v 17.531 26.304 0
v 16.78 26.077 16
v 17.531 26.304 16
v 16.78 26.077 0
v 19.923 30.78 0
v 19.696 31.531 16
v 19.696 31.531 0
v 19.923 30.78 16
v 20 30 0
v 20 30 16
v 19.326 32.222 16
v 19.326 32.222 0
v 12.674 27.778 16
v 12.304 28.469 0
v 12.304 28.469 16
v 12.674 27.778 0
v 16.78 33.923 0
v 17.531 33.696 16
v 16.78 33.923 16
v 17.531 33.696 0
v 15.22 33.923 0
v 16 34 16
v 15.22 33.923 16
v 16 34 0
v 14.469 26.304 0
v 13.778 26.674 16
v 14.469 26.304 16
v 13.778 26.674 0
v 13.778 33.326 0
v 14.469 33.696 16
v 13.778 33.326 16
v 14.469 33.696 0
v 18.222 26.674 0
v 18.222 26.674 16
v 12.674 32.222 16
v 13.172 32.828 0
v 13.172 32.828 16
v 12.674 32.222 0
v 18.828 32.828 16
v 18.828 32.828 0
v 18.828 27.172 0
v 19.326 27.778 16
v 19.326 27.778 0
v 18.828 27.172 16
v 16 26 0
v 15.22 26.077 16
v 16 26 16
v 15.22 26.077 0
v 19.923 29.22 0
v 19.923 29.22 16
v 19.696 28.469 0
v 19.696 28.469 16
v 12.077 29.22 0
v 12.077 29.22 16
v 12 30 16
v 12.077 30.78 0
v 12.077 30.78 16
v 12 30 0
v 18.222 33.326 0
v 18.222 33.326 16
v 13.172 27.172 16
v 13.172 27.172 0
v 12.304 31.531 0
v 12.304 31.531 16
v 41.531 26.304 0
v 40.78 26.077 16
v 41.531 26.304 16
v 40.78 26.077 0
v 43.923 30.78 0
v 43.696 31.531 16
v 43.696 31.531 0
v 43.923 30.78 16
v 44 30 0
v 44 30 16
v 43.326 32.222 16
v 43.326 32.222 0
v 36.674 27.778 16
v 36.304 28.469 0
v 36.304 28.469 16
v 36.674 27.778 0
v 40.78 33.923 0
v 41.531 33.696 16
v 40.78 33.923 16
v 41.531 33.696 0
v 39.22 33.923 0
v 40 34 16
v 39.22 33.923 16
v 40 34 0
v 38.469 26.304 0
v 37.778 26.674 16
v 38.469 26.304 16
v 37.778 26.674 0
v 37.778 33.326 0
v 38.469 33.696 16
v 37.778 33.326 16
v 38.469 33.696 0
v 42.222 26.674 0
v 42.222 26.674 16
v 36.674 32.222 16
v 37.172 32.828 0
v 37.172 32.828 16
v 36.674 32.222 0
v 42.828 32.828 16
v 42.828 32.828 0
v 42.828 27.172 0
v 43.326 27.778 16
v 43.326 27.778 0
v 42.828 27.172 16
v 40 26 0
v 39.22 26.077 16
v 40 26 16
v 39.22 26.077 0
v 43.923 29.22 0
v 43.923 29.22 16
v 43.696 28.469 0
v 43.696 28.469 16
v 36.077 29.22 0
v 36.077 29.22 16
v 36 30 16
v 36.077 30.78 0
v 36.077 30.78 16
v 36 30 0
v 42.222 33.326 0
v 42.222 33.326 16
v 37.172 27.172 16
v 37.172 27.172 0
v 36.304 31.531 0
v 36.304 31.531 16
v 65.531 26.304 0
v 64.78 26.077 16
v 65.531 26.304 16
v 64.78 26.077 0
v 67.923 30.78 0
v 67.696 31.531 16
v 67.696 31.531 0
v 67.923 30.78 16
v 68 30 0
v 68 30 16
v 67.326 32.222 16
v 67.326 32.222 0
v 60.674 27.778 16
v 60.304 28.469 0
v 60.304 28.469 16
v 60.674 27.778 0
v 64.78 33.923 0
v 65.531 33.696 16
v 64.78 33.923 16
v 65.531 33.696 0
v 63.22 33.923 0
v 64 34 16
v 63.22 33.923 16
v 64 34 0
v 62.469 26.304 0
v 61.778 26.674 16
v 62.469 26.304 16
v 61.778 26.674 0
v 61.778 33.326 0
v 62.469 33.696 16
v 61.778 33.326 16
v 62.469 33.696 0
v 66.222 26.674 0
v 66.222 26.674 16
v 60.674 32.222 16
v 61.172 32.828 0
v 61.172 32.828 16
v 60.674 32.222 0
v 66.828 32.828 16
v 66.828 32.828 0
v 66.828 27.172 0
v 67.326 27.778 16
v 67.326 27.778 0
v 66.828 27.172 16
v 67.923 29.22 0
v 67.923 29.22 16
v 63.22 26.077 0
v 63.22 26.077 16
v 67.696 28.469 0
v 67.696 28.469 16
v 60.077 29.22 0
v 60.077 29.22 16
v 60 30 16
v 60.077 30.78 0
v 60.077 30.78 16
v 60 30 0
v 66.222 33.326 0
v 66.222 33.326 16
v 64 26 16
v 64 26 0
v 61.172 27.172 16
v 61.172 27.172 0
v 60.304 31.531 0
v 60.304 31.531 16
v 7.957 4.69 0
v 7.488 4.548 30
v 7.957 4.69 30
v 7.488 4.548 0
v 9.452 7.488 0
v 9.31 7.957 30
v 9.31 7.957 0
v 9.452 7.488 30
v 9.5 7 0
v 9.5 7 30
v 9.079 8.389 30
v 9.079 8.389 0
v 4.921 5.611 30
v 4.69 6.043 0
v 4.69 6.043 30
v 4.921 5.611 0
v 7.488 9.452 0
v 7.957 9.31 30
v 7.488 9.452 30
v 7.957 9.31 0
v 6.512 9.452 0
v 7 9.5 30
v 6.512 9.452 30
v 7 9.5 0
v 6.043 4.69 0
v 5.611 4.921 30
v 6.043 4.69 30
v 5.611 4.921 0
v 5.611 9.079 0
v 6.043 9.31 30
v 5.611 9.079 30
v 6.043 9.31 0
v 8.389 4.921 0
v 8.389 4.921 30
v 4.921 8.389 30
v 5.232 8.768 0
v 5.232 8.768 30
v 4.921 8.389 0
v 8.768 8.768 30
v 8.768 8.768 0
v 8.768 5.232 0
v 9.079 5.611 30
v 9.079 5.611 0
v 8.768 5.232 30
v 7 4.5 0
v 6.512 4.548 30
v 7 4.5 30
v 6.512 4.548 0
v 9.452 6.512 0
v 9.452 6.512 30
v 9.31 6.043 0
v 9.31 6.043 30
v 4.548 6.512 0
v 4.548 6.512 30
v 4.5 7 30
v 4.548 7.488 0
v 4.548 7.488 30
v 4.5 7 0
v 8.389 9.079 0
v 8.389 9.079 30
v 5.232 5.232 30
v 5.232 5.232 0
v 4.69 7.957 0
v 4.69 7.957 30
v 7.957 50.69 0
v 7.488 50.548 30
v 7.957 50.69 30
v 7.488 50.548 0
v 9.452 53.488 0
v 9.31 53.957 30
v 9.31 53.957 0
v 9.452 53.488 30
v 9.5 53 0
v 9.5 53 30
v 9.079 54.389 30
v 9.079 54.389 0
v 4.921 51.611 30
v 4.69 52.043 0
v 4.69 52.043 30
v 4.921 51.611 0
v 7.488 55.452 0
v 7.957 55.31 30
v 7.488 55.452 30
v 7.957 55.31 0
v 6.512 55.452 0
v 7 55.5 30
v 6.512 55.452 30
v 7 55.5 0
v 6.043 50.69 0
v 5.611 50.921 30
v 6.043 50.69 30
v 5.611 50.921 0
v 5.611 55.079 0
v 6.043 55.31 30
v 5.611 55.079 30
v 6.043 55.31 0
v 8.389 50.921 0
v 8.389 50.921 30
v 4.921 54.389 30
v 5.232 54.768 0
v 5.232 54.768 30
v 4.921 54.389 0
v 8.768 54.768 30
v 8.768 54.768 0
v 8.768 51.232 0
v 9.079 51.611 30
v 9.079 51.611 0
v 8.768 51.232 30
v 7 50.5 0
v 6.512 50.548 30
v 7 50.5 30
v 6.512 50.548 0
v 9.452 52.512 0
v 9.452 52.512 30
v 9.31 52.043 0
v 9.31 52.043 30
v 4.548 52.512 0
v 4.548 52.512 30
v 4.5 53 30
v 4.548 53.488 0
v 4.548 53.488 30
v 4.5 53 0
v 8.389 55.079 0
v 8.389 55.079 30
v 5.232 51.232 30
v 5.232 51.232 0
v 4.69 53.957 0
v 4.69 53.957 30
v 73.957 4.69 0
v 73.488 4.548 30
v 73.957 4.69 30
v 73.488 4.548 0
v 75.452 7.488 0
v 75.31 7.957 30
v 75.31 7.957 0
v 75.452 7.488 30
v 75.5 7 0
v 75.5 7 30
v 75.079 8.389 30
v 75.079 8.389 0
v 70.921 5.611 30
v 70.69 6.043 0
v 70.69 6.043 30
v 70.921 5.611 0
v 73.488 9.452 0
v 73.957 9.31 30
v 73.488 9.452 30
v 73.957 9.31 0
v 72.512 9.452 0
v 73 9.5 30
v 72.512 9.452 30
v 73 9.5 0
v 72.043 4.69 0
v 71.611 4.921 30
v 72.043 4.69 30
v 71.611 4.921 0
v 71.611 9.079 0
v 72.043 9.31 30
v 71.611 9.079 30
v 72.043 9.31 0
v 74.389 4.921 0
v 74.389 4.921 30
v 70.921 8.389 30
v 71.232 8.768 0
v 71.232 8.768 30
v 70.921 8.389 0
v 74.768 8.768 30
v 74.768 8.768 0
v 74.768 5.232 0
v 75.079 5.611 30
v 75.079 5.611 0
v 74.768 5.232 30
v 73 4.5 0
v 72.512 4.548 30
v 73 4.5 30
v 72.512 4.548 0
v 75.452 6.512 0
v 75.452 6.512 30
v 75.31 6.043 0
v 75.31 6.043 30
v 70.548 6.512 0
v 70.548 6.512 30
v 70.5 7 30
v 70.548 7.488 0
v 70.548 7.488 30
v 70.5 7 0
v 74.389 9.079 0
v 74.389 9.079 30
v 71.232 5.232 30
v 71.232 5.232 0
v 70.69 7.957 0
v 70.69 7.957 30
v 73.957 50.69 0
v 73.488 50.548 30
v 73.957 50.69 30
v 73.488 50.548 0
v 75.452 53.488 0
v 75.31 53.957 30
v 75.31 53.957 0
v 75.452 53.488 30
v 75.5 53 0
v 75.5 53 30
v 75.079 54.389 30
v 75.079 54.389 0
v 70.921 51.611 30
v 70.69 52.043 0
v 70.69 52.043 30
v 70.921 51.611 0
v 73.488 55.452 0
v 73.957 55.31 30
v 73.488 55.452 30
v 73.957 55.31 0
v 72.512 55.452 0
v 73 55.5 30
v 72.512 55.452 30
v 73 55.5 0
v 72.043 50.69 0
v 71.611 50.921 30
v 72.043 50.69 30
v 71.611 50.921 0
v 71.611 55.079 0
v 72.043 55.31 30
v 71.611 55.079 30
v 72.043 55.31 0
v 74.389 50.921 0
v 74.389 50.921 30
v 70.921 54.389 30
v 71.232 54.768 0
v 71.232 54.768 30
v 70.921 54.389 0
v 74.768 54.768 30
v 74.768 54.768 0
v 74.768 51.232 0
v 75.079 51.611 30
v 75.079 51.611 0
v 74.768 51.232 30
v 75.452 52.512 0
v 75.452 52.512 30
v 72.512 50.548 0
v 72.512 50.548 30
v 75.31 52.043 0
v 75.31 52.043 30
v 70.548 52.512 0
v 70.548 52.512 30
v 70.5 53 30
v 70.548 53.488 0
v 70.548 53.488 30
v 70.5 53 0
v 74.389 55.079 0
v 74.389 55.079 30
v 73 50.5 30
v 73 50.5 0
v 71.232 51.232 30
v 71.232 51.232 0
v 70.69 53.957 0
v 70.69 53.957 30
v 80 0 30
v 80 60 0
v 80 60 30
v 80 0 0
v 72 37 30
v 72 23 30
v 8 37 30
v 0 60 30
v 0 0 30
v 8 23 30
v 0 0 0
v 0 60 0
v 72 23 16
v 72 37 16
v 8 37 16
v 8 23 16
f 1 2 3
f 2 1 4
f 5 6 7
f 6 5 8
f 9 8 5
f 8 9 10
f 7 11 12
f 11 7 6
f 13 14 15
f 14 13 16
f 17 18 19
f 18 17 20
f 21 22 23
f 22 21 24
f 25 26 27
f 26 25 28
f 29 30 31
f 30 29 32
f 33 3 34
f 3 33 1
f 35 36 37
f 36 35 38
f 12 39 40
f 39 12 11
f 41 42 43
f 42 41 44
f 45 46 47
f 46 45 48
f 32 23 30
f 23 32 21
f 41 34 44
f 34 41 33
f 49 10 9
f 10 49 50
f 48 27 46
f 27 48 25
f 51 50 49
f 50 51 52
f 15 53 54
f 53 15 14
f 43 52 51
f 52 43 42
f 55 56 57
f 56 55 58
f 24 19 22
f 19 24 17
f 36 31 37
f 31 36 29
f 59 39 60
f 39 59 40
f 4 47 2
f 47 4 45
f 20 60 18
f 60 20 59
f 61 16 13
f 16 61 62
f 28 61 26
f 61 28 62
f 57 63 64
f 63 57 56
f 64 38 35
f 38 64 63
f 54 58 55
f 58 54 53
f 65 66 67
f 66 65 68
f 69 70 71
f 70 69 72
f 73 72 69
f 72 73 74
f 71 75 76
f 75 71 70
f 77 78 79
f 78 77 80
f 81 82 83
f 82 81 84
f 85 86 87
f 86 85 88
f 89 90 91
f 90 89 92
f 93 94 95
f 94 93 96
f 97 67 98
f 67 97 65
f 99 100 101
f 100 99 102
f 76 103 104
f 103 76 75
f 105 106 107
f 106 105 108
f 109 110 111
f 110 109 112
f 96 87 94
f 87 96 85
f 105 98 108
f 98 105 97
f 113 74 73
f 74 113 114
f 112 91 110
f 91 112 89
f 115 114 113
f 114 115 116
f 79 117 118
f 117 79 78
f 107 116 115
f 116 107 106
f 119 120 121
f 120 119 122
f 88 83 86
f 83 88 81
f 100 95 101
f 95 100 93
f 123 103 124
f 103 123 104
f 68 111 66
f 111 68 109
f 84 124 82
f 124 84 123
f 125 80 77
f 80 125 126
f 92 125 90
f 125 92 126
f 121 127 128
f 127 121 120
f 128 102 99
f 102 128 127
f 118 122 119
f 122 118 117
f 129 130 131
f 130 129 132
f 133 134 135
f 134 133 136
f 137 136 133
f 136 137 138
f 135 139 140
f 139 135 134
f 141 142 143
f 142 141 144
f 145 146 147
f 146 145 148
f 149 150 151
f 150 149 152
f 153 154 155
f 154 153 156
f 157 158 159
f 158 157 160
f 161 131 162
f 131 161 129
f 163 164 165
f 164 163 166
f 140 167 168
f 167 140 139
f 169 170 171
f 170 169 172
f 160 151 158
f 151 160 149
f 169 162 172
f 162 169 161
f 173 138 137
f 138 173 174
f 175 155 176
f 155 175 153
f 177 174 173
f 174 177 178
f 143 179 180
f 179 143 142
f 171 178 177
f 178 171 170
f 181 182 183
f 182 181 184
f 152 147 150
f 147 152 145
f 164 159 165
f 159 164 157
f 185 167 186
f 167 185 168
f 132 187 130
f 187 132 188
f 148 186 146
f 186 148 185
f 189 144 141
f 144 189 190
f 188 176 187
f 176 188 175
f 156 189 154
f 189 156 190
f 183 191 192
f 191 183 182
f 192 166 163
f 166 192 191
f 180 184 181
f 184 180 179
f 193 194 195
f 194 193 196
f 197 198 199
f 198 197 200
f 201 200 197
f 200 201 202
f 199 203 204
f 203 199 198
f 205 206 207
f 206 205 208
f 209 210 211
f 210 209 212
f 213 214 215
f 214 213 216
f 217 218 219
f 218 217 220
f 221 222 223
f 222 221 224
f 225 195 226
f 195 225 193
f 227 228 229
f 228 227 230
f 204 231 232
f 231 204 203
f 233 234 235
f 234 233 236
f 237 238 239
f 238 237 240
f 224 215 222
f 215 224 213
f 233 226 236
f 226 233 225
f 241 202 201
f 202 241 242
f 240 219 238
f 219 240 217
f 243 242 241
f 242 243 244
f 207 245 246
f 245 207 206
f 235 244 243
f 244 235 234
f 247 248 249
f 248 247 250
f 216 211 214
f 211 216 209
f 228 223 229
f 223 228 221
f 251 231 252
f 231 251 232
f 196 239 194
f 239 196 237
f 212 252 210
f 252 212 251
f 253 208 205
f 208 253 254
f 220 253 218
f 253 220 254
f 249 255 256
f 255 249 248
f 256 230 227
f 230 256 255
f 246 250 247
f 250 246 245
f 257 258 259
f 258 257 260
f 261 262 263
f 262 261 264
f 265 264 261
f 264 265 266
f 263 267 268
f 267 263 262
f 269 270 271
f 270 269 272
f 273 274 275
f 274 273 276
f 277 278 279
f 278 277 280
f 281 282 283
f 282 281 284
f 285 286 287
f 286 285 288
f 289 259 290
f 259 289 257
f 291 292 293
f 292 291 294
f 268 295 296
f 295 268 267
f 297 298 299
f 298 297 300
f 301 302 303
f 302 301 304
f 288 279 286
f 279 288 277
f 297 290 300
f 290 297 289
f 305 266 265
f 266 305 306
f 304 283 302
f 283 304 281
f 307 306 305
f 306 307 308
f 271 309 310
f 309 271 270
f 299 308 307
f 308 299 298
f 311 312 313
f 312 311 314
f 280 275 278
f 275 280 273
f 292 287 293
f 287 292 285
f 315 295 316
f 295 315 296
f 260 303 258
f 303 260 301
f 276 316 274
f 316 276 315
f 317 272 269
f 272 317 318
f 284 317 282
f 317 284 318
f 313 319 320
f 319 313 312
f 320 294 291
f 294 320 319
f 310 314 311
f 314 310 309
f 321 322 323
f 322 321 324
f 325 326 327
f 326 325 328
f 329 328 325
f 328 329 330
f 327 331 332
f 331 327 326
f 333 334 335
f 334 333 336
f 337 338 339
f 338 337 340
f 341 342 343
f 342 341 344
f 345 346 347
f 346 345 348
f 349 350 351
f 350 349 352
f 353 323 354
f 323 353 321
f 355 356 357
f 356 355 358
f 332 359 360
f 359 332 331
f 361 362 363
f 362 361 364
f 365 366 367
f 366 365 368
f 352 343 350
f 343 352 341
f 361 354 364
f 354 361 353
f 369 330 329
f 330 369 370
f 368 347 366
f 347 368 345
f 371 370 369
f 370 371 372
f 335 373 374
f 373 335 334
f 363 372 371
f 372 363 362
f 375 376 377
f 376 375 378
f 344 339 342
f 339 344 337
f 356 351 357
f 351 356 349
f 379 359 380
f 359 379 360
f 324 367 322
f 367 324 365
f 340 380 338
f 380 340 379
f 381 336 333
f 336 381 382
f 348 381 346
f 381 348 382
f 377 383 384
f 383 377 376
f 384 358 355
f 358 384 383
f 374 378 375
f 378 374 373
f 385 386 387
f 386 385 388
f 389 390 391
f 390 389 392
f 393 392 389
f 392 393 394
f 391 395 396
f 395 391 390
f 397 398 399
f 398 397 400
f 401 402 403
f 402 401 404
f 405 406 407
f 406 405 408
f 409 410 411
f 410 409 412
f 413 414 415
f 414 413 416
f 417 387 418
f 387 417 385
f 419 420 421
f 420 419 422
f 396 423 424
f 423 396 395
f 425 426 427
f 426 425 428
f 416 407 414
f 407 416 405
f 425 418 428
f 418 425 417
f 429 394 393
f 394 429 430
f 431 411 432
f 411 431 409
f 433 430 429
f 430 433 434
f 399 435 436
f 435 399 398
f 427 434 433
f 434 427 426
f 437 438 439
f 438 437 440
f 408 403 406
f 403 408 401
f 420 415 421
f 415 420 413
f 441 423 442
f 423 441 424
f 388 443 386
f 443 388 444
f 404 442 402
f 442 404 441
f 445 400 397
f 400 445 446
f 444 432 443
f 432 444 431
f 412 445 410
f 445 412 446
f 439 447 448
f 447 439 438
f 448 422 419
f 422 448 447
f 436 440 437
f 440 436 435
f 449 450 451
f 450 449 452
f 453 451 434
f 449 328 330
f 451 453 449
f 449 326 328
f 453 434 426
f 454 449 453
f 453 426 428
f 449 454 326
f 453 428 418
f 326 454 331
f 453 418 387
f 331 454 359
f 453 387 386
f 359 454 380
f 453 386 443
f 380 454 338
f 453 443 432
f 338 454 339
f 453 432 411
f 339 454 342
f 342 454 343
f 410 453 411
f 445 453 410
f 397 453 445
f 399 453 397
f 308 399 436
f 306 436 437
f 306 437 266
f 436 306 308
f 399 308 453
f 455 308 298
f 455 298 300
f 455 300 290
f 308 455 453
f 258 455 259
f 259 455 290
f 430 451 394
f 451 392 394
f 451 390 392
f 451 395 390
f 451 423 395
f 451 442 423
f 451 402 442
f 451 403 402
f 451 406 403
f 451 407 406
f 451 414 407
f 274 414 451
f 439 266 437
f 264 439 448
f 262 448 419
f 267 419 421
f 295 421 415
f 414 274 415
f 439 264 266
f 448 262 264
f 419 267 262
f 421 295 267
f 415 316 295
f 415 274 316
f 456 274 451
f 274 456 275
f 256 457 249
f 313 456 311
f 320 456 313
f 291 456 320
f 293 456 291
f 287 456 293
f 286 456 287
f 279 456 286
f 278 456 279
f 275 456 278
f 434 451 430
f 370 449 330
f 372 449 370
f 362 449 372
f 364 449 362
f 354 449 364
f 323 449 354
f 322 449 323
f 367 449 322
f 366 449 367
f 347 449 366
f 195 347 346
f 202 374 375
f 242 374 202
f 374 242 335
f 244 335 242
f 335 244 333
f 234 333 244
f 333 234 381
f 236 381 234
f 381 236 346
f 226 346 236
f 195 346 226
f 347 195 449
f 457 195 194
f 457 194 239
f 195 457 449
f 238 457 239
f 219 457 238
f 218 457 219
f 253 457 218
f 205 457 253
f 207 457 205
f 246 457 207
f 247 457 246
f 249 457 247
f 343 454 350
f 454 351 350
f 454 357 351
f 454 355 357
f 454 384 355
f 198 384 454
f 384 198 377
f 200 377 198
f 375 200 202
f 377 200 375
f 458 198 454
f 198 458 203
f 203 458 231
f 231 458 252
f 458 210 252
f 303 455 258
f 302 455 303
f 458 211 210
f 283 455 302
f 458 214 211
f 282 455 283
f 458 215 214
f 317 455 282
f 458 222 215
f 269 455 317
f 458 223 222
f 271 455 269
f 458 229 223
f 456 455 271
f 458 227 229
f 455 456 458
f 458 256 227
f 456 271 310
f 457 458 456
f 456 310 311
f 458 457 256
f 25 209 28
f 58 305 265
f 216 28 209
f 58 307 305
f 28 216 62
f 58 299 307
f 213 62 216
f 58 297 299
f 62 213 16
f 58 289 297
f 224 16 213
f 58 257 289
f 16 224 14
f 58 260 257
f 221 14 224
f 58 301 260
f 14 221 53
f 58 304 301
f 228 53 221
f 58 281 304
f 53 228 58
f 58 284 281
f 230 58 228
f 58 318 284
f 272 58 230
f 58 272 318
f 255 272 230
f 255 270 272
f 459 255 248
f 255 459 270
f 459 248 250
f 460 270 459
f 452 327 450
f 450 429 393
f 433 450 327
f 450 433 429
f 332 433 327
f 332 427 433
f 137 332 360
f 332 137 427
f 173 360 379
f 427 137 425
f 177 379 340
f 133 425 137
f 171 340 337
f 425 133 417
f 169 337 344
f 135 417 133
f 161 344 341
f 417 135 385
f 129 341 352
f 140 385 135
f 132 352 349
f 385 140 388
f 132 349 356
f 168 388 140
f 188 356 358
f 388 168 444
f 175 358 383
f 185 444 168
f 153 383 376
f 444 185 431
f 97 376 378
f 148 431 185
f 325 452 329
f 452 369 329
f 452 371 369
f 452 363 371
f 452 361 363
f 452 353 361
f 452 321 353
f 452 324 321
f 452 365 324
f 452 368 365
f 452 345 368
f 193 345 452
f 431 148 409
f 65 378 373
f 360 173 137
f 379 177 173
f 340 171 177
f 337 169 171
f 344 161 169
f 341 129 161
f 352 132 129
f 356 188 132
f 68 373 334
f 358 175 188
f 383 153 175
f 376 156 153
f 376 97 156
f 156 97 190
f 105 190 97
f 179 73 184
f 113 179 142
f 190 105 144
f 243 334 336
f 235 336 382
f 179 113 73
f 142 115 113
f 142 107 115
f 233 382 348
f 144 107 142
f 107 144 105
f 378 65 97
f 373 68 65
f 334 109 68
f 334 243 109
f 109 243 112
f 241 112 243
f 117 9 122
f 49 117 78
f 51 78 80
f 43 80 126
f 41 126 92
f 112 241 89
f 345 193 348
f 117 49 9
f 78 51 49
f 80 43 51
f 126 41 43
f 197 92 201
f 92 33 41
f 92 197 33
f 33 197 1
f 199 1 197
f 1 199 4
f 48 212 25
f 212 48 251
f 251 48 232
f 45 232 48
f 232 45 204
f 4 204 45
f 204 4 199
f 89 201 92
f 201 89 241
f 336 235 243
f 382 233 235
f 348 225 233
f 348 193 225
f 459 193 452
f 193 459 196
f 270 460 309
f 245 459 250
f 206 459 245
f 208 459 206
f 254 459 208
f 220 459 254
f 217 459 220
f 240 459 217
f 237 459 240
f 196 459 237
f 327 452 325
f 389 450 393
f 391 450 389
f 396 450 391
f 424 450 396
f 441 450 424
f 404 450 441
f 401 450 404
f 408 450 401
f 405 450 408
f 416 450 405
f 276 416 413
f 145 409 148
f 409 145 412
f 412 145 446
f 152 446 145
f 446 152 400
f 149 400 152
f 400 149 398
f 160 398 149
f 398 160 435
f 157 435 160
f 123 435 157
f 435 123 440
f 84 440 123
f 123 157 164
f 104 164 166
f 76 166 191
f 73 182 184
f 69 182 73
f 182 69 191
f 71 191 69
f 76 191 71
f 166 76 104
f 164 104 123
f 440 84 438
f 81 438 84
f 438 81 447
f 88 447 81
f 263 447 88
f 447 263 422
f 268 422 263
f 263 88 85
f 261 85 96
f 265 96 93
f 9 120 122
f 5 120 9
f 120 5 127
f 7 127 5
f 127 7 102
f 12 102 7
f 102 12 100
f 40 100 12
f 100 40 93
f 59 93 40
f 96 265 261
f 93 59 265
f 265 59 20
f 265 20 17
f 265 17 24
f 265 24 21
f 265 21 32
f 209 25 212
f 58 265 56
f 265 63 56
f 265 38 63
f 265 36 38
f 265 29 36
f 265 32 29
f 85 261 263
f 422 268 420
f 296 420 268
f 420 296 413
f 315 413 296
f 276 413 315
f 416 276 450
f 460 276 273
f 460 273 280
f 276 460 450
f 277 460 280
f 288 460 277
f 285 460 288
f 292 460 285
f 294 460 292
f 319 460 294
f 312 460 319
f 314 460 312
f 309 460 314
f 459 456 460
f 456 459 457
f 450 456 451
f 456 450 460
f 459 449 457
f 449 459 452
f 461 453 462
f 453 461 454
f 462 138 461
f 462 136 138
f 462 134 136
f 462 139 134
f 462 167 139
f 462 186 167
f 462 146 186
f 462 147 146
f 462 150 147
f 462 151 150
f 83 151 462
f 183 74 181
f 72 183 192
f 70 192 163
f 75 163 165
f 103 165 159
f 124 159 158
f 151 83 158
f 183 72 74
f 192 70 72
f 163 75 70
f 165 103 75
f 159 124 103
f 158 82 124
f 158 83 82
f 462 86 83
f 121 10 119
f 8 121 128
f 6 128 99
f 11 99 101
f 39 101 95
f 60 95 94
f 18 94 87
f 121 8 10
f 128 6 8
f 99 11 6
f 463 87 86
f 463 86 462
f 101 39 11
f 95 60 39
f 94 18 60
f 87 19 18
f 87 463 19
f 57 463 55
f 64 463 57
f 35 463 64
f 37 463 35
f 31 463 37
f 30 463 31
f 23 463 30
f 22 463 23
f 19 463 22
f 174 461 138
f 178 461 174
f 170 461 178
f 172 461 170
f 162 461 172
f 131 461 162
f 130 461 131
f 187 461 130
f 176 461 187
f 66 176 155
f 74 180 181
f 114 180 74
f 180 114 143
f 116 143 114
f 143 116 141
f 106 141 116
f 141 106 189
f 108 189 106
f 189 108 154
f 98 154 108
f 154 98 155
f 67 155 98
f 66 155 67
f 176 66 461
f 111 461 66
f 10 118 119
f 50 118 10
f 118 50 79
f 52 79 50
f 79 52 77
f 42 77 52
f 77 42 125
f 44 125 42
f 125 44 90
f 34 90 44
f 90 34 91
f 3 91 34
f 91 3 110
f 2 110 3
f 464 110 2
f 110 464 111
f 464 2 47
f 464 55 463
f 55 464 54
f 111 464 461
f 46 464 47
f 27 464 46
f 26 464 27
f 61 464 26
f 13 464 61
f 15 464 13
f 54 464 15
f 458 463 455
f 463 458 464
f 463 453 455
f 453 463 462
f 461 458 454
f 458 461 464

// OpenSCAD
$fn = 32;

// ----------------------------------------------------------------------
// Manifold block: gallery_top manifold
// ----------------------------------------------------------------------

// --- parameters (mm) ---
block_l = 80;             // block length, X
block_w = 60;             // block width, Y
block_h = 30;             // block height, Z
port_d = 8;               // port bore diameter
port_pitch = 24;          // port pitch along X
gallery_d = 14;           // top gallery width, Y
gallery_depth = 14;       // gallery pocket depth
wall_p = 8;               // gallery end wall thickness, X
mnt_d = 5;                // mounting hole diameter
mnt_in = 7;               // mounting hole inset from the edges
fit_tol = 0.1;            // tolerance for press fits, mm
free_tol = 0.5;           // tolerance for clearance fits, mm

n_ports = 3;  // ports in the row
port_x0 = (block_l - (n_ports - 1) * port_pitch) / 2;  // first port X

difference() {
  cube([block_l, block_w, block_h]);
  for (i = [0 : n_ports - 1])
    translate([port_x0 + i * port_pitch, block_w / 2, -1])
      cylinder(h = block_h + 2, d = port_d);
  translate([wall_p, block_w / 2 - gallery_d / 2, block_h - gallery_depth])
    cube([block_l - 2 * wall_p, gallery_d, gallery_depth + 1]);
  for (cx = [mnt_in, block_l - mnt_in])
    for (cy = [mnt_in, block_w - mnt_in])
      translate([cx, cy, -1]) cylinder(h = block_h + 2, d = mnt_d);
}
